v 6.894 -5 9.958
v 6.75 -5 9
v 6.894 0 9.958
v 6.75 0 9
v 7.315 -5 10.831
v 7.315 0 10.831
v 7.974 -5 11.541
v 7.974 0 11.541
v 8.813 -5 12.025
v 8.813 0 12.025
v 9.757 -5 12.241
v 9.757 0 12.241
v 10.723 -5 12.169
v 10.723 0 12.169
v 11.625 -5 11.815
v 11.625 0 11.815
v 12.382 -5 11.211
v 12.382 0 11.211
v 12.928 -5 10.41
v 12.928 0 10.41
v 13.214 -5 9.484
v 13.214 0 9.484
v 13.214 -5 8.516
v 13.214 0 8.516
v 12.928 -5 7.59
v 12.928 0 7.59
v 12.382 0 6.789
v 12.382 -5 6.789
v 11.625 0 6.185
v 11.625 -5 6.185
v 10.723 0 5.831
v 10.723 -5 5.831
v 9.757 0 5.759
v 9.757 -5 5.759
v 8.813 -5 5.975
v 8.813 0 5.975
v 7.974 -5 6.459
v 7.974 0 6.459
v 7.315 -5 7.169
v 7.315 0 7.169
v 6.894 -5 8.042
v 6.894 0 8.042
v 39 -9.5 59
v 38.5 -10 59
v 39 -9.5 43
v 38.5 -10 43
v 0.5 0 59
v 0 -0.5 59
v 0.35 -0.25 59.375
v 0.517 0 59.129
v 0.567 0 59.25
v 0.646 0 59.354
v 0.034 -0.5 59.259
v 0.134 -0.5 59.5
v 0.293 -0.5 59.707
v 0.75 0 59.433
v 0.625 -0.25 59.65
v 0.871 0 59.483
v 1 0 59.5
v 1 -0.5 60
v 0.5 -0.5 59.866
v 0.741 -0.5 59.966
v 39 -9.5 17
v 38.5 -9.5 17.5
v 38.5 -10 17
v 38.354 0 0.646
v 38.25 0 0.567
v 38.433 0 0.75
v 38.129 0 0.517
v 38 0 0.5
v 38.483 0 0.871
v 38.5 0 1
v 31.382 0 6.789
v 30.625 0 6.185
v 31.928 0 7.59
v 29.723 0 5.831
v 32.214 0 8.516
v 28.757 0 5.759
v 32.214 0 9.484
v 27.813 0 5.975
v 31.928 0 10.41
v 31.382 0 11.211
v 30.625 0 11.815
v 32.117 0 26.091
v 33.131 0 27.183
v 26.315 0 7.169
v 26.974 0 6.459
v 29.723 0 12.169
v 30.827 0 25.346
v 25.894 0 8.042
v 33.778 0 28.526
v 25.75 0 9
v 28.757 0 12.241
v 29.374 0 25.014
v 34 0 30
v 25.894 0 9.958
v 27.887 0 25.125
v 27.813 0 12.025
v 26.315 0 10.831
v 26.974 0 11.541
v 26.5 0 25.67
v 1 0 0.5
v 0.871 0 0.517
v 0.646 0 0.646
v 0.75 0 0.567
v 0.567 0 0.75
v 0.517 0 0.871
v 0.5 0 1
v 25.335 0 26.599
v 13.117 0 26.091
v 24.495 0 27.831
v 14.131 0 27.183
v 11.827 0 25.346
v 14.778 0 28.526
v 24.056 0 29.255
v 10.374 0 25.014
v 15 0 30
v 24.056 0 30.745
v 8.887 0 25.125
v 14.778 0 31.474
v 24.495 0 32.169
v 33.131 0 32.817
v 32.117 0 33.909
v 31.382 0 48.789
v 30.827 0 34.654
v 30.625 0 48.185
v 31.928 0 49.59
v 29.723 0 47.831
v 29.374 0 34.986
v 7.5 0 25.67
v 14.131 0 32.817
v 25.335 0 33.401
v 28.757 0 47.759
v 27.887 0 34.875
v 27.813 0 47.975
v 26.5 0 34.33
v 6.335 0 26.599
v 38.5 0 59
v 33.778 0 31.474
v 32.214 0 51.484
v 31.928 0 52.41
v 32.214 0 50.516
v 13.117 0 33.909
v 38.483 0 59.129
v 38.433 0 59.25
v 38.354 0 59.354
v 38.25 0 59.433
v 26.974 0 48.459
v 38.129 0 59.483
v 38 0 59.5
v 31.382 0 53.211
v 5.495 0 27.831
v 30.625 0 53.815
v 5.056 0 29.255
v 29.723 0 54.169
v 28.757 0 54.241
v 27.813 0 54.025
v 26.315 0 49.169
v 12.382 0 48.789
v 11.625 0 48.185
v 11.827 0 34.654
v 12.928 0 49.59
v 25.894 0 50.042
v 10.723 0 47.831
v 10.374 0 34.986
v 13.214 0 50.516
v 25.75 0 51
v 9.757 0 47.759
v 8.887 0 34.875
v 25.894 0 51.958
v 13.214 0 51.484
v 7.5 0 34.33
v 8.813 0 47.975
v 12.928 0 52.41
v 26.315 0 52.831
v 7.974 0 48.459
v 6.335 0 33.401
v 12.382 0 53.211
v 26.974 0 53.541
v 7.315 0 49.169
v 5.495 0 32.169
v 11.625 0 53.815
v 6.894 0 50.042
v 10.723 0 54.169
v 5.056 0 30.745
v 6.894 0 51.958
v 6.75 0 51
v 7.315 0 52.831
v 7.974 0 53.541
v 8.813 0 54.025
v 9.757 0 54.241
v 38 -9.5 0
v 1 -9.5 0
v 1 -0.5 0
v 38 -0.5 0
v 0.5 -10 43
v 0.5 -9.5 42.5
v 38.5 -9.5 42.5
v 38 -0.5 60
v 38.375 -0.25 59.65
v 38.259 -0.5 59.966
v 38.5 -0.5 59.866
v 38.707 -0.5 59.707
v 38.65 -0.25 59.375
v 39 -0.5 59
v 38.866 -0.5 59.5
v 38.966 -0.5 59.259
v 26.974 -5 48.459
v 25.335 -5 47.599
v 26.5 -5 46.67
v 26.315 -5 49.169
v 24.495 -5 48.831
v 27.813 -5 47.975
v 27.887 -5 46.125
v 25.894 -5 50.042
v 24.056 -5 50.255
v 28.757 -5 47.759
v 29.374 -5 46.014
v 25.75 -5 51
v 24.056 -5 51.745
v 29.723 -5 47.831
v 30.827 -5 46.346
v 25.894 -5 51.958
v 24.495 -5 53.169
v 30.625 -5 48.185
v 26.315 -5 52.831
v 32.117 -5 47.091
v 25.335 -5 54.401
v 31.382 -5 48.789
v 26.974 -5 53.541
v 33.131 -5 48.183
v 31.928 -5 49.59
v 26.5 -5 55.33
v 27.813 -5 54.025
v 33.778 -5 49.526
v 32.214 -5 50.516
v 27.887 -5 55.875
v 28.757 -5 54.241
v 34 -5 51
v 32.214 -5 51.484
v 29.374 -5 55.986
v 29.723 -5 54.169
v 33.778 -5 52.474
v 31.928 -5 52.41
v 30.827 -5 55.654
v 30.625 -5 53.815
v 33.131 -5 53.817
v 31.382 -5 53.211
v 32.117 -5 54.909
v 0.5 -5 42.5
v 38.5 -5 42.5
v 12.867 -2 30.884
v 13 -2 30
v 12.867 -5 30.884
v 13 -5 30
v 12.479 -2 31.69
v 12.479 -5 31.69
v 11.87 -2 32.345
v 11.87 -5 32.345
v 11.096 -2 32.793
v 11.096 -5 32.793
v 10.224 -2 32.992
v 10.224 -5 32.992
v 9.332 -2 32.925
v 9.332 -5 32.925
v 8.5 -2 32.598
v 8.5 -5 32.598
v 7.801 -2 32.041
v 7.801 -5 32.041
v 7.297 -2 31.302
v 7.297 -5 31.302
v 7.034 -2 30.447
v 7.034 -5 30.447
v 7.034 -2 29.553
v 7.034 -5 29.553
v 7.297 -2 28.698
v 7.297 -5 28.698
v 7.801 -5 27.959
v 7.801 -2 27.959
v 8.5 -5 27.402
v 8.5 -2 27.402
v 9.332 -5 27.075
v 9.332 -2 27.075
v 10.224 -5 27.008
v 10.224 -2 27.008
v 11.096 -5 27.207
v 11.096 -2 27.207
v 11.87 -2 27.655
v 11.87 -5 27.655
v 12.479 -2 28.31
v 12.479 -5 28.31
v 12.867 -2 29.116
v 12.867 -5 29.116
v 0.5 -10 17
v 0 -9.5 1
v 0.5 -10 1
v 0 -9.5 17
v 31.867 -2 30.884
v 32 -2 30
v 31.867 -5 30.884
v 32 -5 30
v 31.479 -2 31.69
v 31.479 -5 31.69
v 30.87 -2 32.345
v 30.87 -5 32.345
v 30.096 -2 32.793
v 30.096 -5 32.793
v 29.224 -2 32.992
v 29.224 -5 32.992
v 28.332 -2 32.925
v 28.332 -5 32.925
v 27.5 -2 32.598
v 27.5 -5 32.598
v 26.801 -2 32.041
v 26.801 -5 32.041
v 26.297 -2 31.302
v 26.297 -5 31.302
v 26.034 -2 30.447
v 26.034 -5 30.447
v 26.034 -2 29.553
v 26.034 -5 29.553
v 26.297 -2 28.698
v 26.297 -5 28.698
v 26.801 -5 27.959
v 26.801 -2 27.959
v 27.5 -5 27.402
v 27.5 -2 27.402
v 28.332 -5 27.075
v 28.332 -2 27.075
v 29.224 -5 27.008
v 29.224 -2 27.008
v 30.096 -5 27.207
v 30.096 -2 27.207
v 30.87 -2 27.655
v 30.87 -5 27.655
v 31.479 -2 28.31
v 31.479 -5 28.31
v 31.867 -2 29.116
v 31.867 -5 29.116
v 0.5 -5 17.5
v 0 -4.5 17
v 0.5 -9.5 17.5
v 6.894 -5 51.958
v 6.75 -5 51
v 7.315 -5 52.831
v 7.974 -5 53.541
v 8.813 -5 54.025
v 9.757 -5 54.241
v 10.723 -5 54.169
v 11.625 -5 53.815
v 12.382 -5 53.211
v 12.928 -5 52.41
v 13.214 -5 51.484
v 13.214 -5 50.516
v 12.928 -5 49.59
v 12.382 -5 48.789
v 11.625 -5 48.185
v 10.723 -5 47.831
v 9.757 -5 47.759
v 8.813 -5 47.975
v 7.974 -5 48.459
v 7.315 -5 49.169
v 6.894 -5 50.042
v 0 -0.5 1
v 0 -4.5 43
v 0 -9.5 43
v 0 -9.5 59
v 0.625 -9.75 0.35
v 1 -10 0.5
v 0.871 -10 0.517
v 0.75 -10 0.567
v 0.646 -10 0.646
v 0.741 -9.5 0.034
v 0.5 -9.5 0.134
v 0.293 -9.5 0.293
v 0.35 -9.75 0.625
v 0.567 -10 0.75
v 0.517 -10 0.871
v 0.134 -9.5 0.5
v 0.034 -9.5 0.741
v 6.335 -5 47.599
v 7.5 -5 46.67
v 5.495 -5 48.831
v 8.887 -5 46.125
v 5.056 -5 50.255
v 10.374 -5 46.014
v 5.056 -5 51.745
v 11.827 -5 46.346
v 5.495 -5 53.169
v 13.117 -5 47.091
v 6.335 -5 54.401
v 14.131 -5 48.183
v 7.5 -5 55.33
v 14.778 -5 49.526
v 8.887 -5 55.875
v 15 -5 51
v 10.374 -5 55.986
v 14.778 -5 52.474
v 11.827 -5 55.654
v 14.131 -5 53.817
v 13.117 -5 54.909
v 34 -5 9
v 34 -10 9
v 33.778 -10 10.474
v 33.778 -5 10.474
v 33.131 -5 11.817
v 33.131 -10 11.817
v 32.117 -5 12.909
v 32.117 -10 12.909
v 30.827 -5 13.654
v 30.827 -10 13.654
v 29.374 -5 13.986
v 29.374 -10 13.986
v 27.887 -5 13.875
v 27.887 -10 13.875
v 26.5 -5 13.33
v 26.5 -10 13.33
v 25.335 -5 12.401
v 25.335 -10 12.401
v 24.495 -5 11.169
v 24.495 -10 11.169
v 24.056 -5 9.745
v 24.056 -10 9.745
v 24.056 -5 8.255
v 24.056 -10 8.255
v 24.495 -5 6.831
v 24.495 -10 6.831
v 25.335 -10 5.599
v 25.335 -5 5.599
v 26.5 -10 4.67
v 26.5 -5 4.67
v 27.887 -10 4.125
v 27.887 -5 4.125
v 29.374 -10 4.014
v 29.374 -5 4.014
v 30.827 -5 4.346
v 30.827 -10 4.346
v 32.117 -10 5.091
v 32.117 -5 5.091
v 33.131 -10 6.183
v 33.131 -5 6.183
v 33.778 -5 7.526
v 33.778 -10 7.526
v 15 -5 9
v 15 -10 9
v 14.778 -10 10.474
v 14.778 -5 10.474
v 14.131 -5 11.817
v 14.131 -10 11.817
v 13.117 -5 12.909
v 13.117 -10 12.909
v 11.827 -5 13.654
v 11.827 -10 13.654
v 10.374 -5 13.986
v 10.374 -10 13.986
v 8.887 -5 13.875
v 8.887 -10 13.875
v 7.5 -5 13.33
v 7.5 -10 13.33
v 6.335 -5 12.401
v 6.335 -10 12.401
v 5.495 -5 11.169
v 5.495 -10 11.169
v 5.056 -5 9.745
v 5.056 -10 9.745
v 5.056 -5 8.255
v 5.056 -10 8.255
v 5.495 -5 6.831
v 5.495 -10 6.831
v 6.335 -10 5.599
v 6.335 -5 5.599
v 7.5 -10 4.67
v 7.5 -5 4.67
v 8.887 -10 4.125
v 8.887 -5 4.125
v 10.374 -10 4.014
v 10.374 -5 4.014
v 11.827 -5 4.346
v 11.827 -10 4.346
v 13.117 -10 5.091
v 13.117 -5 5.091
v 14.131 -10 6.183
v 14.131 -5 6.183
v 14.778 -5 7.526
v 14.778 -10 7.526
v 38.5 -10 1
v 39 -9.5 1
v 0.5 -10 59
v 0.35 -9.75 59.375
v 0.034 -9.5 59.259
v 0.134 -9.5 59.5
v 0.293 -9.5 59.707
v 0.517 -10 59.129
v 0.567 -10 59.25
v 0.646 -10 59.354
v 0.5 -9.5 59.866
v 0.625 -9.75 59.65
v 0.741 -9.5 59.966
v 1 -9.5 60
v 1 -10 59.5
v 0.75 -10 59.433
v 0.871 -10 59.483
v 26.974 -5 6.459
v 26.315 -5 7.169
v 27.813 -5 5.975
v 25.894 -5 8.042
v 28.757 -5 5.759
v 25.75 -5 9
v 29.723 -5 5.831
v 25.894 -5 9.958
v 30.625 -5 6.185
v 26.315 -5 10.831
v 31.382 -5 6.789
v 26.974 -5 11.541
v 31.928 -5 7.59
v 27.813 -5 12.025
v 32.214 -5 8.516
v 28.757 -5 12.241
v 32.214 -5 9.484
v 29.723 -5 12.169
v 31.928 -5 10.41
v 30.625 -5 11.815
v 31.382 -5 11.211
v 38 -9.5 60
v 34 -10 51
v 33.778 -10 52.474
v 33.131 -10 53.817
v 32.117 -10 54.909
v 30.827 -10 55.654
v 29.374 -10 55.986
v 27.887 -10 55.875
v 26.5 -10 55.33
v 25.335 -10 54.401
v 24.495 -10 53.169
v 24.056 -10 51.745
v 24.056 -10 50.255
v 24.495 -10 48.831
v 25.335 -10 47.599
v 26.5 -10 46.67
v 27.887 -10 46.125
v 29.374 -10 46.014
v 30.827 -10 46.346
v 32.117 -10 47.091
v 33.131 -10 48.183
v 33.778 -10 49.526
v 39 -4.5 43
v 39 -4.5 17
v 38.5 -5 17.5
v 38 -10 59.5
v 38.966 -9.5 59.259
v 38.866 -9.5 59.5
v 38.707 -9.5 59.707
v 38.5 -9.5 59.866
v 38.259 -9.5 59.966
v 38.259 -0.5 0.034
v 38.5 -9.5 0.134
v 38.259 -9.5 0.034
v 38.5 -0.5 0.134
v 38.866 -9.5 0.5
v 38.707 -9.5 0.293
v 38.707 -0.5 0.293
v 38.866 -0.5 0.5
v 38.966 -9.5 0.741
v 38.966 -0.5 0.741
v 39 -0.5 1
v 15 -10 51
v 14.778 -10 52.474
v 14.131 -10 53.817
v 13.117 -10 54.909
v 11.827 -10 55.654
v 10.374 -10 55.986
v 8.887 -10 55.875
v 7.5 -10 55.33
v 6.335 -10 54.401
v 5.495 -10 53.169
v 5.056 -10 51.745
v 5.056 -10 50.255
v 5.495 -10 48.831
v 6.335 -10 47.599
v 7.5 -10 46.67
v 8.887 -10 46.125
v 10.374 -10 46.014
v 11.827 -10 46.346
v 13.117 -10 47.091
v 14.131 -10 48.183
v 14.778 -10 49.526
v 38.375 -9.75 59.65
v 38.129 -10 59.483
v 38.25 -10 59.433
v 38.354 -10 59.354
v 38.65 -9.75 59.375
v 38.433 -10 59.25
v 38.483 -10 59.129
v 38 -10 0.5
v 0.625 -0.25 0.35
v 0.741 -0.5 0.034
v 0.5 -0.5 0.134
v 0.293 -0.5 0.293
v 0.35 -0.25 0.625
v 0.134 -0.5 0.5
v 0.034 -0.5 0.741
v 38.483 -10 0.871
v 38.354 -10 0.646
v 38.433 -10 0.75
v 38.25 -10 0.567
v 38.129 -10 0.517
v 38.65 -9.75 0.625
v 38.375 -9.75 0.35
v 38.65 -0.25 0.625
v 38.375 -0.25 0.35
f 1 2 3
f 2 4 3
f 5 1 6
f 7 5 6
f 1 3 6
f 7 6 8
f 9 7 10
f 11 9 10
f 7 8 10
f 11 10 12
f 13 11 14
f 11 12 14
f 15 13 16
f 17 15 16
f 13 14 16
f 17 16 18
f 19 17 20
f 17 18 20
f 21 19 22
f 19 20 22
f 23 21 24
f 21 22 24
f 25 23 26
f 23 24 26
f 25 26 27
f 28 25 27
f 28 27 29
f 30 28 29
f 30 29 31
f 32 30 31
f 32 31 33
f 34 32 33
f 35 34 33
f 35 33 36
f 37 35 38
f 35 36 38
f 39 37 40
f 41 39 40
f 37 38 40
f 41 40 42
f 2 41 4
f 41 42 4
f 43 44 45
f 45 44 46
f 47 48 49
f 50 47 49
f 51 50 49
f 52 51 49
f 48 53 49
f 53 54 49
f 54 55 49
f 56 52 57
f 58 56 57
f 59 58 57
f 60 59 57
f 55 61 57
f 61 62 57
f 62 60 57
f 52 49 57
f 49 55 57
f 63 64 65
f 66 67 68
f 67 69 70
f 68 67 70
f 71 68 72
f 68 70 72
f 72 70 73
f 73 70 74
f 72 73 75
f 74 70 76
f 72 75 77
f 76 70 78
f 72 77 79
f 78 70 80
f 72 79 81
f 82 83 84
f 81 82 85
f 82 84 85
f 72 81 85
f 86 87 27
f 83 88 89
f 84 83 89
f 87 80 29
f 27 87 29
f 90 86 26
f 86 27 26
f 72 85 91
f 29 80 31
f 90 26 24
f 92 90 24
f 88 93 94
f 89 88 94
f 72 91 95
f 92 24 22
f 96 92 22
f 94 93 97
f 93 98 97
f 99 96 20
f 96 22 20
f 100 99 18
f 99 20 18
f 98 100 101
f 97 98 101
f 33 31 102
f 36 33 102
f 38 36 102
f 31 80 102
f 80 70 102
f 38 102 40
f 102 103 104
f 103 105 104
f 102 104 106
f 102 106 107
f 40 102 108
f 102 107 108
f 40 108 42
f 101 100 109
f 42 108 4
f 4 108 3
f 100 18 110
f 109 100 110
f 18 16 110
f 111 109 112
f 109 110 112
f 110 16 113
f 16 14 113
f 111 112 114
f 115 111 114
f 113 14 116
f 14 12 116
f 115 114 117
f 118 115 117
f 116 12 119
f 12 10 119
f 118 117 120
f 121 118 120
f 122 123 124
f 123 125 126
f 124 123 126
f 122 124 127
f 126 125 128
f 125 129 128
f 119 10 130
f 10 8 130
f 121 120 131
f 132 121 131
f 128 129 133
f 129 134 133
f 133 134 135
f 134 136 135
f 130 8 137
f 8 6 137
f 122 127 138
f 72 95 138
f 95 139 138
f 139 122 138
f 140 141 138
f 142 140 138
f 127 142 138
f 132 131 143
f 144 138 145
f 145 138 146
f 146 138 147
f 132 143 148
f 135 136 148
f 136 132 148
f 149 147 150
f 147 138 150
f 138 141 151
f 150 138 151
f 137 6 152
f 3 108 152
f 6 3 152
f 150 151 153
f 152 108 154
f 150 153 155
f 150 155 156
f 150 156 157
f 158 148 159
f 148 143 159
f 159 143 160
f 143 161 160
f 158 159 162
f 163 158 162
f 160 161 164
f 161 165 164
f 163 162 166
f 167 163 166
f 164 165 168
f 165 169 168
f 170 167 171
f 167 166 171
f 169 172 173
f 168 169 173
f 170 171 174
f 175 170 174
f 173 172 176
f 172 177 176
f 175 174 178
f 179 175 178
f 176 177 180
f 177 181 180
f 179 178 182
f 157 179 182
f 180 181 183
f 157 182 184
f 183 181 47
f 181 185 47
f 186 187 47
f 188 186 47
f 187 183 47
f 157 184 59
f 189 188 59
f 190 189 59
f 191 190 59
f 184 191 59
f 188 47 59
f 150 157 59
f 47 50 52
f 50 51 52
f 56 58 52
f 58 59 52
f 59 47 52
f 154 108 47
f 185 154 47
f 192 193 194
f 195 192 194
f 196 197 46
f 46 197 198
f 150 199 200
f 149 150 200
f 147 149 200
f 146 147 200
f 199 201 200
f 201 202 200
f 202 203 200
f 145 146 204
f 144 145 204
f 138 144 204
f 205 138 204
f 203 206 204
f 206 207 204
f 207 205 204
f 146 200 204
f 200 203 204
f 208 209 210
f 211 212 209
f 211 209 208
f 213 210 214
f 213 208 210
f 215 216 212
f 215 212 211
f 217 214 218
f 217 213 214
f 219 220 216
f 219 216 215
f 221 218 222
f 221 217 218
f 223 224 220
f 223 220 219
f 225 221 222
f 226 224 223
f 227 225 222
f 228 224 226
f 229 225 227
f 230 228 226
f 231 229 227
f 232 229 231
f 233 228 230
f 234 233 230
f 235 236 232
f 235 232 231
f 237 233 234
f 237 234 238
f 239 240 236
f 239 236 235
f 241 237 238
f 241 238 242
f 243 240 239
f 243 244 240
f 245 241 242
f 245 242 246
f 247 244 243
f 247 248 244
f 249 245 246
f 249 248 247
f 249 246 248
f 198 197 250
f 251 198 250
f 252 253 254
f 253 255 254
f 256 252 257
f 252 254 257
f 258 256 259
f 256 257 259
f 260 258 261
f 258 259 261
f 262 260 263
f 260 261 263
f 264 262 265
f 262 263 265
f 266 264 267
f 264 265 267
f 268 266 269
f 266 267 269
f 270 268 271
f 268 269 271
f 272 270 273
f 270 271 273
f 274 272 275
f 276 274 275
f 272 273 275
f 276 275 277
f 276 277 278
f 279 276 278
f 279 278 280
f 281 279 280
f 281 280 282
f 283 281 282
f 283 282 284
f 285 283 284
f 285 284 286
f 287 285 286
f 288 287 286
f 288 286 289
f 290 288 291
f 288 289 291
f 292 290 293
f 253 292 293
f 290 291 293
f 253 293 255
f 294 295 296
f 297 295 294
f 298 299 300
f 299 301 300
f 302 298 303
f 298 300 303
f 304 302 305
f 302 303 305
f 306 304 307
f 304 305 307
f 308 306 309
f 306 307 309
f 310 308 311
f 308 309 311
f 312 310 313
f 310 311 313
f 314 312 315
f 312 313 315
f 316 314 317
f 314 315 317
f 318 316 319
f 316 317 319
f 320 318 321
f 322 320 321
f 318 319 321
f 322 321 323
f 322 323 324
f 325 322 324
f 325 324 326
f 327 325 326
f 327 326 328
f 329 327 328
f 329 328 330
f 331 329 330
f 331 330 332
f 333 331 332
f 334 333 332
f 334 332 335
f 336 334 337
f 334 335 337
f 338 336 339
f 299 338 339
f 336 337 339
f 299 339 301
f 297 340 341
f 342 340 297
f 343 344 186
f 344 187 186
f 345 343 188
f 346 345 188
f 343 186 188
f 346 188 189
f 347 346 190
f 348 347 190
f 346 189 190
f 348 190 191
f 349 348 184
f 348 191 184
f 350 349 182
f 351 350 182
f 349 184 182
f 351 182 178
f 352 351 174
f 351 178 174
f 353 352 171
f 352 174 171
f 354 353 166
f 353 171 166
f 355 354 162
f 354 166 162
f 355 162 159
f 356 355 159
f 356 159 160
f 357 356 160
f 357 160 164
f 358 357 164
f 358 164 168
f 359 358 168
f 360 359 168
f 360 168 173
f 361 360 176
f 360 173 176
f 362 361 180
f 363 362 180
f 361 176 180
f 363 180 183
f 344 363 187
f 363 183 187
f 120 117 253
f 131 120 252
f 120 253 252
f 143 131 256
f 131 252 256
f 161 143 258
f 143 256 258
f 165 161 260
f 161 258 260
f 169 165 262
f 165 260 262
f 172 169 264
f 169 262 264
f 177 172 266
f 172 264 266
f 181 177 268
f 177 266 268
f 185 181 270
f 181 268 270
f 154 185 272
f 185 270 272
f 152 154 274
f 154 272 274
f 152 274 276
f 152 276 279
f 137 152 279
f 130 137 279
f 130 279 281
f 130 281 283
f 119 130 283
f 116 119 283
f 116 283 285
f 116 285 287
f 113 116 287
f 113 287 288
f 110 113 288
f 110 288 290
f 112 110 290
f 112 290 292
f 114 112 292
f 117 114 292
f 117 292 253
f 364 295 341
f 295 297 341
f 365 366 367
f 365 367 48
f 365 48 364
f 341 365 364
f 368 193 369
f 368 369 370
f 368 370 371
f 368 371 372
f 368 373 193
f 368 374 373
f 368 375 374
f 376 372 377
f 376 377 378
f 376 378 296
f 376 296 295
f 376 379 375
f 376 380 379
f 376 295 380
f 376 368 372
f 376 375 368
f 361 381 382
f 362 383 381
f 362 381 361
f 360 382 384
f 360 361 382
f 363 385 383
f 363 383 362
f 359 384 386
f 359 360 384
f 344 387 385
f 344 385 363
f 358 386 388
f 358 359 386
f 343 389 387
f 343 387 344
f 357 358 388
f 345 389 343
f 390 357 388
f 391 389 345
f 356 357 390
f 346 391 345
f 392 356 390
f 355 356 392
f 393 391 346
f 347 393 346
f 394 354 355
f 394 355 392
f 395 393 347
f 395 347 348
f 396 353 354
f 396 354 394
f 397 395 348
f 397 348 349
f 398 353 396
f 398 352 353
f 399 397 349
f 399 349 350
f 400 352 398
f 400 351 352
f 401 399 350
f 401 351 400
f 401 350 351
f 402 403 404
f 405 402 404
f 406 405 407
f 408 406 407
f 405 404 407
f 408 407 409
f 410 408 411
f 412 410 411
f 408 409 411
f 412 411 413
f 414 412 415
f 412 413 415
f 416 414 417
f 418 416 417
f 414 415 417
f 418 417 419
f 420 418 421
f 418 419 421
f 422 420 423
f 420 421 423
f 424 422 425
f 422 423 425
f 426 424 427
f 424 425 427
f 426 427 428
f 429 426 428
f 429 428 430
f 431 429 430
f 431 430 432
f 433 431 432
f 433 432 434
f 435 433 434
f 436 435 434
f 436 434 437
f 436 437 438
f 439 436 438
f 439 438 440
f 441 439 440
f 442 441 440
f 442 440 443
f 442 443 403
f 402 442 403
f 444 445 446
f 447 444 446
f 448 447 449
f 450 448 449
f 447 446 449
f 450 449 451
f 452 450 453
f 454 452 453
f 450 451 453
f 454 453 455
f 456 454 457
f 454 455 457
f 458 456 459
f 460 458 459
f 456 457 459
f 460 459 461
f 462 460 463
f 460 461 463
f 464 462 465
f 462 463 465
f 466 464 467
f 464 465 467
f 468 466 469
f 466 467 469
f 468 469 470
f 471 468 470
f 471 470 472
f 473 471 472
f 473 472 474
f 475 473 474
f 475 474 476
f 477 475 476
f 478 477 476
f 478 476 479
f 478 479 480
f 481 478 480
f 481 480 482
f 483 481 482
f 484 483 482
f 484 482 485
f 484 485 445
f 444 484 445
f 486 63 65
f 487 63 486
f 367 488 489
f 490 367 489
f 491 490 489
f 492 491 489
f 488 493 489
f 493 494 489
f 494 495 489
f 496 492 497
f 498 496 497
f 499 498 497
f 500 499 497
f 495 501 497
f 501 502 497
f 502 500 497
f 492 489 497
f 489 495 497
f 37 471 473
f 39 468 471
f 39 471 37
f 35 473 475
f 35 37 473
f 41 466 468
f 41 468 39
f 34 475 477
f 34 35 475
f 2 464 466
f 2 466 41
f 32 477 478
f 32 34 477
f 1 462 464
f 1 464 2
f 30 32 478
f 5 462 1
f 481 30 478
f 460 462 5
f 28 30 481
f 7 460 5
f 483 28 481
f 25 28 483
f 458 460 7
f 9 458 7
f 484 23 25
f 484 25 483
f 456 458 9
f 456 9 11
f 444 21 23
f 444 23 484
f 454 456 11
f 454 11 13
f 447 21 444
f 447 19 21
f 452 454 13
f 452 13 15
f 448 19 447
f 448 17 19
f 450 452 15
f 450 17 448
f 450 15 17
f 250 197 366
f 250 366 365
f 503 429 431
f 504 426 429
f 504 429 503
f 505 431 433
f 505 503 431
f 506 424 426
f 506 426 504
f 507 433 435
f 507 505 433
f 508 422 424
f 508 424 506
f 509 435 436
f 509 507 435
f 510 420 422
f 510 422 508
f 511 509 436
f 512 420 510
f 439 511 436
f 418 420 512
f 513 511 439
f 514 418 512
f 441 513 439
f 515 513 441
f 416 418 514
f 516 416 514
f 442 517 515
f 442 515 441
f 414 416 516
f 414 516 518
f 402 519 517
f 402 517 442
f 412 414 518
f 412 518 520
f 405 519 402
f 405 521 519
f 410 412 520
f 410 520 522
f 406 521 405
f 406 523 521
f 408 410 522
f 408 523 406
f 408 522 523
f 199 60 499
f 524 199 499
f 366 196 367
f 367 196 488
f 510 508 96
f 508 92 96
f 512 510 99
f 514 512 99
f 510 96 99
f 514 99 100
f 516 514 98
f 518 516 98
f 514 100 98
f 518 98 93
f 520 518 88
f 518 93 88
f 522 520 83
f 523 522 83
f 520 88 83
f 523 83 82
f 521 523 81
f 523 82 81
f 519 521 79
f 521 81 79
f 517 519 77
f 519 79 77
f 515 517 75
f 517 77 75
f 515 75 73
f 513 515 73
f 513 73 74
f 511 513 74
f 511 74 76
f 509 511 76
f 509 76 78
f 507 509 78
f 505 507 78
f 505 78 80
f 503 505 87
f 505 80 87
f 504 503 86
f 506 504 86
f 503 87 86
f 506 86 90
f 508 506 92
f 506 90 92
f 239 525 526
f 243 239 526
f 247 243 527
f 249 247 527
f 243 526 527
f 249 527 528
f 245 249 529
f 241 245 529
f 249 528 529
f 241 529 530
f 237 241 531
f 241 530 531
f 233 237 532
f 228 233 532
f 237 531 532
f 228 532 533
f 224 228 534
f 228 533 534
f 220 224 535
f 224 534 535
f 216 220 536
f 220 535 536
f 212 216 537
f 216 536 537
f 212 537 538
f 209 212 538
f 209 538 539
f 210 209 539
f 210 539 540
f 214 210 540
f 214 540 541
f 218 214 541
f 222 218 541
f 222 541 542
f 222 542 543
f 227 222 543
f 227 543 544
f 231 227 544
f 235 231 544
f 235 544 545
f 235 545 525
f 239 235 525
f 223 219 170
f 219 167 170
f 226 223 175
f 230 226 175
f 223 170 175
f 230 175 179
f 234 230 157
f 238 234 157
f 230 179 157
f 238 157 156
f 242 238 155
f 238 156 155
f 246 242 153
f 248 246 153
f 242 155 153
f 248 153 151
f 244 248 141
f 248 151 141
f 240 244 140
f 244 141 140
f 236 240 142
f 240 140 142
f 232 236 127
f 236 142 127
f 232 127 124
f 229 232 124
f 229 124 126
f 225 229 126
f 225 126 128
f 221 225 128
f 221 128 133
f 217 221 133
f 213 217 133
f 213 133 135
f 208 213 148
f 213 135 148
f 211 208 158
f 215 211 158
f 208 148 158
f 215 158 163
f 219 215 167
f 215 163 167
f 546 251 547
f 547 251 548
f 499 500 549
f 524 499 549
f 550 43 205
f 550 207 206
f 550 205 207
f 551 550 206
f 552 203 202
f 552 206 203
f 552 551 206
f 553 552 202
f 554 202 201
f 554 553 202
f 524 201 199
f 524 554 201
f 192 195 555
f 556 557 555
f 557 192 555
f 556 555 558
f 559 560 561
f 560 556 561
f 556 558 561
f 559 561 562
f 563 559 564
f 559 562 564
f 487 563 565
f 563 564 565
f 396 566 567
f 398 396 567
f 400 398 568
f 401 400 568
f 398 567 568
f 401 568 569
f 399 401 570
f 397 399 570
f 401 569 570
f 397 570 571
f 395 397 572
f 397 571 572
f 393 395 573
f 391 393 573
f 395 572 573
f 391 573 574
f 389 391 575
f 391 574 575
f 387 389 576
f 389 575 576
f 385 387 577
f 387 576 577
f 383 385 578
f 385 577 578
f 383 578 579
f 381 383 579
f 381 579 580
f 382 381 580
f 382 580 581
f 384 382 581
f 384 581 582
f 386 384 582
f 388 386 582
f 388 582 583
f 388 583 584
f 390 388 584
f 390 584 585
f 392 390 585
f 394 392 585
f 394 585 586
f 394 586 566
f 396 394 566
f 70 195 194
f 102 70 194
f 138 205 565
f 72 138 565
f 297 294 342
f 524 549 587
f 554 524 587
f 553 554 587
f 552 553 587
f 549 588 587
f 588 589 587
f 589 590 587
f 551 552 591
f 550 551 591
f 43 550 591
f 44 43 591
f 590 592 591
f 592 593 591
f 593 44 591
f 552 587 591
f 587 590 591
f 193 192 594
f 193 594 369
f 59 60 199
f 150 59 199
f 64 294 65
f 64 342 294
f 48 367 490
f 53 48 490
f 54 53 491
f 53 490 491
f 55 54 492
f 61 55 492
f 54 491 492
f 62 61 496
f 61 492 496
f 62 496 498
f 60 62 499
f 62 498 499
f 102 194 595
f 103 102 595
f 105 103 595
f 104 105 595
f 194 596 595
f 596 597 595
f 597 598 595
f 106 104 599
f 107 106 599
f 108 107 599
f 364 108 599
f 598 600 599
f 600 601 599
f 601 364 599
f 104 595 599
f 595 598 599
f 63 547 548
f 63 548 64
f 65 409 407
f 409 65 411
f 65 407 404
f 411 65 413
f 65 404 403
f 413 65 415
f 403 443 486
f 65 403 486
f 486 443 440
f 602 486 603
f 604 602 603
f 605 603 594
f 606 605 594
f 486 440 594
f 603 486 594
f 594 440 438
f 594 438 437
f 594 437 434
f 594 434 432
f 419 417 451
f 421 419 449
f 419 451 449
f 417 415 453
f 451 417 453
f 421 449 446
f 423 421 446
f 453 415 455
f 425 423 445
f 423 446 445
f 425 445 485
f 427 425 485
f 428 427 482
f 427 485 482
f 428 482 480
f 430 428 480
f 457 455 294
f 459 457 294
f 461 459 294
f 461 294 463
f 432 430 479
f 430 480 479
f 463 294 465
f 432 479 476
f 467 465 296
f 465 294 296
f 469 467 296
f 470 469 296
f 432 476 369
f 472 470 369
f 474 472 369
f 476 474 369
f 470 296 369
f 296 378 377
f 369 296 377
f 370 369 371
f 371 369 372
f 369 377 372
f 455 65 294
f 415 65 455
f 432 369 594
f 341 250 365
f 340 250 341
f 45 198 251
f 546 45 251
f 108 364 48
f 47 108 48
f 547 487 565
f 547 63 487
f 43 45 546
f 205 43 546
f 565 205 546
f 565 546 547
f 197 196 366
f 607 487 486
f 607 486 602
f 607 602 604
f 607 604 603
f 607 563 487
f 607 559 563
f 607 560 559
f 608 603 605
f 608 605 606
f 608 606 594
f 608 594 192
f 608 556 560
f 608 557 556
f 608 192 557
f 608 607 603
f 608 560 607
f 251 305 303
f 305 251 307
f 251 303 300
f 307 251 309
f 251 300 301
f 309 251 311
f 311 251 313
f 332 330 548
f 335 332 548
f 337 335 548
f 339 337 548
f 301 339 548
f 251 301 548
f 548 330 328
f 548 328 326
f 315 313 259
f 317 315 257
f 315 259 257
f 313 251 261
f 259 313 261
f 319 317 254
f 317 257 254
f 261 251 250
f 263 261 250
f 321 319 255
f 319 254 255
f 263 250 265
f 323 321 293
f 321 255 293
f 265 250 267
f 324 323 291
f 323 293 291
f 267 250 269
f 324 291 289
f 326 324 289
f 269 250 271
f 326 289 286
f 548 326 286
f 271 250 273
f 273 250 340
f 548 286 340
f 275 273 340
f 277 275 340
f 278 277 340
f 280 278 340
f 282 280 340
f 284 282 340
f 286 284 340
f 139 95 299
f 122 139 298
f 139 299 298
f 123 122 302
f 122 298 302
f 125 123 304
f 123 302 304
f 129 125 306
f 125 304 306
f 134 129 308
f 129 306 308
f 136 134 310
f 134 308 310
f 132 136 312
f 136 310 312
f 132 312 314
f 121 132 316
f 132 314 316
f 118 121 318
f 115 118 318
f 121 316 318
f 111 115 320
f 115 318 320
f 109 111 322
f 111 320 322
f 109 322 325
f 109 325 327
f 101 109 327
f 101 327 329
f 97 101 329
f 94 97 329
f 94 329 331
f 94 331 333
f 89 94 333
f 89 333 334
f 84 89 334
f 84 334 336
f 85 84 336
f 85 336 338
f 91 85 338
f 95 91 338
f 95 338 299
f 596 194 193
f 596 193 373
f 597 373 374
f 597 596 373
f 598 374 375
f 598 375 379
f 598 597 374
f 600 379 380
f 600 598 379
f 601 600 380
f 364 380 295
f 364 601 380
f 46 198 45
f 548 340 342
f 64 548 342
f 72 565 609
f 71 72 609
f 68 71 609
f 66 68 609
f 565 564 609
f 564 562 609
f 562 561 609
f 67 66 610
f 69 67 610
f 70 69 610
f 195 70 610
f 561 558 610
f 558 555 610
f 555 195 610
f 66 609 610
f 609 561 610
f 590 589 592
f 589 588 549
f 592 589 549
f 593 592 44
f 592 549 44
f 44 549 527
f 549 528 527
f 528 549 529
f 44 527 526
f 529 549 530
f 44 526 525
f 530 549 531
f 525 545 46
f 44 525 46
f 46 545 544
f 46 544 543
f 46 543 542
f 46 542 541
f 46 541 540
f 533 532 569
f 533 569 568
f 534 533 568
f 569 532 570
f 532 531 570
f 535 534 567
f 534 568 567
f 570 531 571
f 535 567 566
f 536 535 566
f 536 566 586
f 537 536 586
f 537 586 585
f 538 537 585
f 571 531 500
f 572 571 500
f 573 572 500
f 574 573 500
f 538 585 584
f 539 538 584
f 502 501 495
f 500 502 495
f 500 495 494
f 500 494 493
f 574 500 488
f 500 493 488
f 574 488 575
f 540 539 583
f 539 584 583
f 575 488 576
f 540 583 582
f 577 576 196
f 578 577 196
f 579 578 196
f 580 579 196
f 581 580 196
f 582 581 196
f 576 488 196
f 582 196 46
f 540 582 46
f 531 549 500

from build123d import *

# Parameters (mm, degrees)
F1_DEPTH       = 39
F5_D           = 6
F5_CSINK_D     = 10
F5_CSINK_ANGLE = 90
F6_D           = 6.5
F6_CBORE_D     = 10
F6_CBORE_DEPTH = 5
F7_R           = 1
F8_SIZE        = 0.5


with BuildPart() as f1:
    # F0 (on Right) → F1 (new body)
    with BuildSketch(Plane.YZ):
        Polygon((-10, 0), (0, 0), (0, 60), (-10, 60), (-10, 42.5), (-5, 42.5), (-5, 17.5), (-10, 17.5), align=None)
    extrude(amount=F1_DEPTH)

    # F5 (through all)
    with Locations(Plane(origin=(0, 0, 0), x_dir=(-1, 0, 0), z_dir=(0, 1, 0))):
        with Locations((-29, 30), (-10, 30)):
            CounterSinkHole(F5_D / 2, F5_CSINK_D / 2, counter_sink_angle=F5_CSINK_ANGLE)

    # F6 (through all)
    with Locations(Plane.XZ.offset(10)):
        with Locations((10, 51), (29, 51), (10, 9), (29, 9)):
            CounterBoreHole(F6_D / 2, F6_CBORE_D / 2, F6_CBORE_DEPTH)

    # F7
    f7_edges = [f1.edges().sort_by_distance(p)[0] for p in [
        (39, -5, 60),
        (39, -5, 0),
        (0, -5, 60),
        (0, -5, 0),
    ]]
    fillet(f7_edges, radius=F7_R)

    # F8
    f8_edges = [f1.edges().sort_by_distance(p)[0] for p in [
        (19.5, -10, 42.5),
        (19.5, -10, 17.5),
        (39, -7.5, 42.5),
        (39, -5, 30),
        (39, -7.5, 17.5),
        (39, -10, 50.75),
        (39, -10, 9.25),
        (0, -7.5, 42.5),
        (0, -7.5, 17.5),
        (0, -10, 50.75),
        (0, 0, 30),
        (0, -5, 30),
    ]]
    chamfer(f8_edges, length=F8_SIZE)


solid = f1.part
